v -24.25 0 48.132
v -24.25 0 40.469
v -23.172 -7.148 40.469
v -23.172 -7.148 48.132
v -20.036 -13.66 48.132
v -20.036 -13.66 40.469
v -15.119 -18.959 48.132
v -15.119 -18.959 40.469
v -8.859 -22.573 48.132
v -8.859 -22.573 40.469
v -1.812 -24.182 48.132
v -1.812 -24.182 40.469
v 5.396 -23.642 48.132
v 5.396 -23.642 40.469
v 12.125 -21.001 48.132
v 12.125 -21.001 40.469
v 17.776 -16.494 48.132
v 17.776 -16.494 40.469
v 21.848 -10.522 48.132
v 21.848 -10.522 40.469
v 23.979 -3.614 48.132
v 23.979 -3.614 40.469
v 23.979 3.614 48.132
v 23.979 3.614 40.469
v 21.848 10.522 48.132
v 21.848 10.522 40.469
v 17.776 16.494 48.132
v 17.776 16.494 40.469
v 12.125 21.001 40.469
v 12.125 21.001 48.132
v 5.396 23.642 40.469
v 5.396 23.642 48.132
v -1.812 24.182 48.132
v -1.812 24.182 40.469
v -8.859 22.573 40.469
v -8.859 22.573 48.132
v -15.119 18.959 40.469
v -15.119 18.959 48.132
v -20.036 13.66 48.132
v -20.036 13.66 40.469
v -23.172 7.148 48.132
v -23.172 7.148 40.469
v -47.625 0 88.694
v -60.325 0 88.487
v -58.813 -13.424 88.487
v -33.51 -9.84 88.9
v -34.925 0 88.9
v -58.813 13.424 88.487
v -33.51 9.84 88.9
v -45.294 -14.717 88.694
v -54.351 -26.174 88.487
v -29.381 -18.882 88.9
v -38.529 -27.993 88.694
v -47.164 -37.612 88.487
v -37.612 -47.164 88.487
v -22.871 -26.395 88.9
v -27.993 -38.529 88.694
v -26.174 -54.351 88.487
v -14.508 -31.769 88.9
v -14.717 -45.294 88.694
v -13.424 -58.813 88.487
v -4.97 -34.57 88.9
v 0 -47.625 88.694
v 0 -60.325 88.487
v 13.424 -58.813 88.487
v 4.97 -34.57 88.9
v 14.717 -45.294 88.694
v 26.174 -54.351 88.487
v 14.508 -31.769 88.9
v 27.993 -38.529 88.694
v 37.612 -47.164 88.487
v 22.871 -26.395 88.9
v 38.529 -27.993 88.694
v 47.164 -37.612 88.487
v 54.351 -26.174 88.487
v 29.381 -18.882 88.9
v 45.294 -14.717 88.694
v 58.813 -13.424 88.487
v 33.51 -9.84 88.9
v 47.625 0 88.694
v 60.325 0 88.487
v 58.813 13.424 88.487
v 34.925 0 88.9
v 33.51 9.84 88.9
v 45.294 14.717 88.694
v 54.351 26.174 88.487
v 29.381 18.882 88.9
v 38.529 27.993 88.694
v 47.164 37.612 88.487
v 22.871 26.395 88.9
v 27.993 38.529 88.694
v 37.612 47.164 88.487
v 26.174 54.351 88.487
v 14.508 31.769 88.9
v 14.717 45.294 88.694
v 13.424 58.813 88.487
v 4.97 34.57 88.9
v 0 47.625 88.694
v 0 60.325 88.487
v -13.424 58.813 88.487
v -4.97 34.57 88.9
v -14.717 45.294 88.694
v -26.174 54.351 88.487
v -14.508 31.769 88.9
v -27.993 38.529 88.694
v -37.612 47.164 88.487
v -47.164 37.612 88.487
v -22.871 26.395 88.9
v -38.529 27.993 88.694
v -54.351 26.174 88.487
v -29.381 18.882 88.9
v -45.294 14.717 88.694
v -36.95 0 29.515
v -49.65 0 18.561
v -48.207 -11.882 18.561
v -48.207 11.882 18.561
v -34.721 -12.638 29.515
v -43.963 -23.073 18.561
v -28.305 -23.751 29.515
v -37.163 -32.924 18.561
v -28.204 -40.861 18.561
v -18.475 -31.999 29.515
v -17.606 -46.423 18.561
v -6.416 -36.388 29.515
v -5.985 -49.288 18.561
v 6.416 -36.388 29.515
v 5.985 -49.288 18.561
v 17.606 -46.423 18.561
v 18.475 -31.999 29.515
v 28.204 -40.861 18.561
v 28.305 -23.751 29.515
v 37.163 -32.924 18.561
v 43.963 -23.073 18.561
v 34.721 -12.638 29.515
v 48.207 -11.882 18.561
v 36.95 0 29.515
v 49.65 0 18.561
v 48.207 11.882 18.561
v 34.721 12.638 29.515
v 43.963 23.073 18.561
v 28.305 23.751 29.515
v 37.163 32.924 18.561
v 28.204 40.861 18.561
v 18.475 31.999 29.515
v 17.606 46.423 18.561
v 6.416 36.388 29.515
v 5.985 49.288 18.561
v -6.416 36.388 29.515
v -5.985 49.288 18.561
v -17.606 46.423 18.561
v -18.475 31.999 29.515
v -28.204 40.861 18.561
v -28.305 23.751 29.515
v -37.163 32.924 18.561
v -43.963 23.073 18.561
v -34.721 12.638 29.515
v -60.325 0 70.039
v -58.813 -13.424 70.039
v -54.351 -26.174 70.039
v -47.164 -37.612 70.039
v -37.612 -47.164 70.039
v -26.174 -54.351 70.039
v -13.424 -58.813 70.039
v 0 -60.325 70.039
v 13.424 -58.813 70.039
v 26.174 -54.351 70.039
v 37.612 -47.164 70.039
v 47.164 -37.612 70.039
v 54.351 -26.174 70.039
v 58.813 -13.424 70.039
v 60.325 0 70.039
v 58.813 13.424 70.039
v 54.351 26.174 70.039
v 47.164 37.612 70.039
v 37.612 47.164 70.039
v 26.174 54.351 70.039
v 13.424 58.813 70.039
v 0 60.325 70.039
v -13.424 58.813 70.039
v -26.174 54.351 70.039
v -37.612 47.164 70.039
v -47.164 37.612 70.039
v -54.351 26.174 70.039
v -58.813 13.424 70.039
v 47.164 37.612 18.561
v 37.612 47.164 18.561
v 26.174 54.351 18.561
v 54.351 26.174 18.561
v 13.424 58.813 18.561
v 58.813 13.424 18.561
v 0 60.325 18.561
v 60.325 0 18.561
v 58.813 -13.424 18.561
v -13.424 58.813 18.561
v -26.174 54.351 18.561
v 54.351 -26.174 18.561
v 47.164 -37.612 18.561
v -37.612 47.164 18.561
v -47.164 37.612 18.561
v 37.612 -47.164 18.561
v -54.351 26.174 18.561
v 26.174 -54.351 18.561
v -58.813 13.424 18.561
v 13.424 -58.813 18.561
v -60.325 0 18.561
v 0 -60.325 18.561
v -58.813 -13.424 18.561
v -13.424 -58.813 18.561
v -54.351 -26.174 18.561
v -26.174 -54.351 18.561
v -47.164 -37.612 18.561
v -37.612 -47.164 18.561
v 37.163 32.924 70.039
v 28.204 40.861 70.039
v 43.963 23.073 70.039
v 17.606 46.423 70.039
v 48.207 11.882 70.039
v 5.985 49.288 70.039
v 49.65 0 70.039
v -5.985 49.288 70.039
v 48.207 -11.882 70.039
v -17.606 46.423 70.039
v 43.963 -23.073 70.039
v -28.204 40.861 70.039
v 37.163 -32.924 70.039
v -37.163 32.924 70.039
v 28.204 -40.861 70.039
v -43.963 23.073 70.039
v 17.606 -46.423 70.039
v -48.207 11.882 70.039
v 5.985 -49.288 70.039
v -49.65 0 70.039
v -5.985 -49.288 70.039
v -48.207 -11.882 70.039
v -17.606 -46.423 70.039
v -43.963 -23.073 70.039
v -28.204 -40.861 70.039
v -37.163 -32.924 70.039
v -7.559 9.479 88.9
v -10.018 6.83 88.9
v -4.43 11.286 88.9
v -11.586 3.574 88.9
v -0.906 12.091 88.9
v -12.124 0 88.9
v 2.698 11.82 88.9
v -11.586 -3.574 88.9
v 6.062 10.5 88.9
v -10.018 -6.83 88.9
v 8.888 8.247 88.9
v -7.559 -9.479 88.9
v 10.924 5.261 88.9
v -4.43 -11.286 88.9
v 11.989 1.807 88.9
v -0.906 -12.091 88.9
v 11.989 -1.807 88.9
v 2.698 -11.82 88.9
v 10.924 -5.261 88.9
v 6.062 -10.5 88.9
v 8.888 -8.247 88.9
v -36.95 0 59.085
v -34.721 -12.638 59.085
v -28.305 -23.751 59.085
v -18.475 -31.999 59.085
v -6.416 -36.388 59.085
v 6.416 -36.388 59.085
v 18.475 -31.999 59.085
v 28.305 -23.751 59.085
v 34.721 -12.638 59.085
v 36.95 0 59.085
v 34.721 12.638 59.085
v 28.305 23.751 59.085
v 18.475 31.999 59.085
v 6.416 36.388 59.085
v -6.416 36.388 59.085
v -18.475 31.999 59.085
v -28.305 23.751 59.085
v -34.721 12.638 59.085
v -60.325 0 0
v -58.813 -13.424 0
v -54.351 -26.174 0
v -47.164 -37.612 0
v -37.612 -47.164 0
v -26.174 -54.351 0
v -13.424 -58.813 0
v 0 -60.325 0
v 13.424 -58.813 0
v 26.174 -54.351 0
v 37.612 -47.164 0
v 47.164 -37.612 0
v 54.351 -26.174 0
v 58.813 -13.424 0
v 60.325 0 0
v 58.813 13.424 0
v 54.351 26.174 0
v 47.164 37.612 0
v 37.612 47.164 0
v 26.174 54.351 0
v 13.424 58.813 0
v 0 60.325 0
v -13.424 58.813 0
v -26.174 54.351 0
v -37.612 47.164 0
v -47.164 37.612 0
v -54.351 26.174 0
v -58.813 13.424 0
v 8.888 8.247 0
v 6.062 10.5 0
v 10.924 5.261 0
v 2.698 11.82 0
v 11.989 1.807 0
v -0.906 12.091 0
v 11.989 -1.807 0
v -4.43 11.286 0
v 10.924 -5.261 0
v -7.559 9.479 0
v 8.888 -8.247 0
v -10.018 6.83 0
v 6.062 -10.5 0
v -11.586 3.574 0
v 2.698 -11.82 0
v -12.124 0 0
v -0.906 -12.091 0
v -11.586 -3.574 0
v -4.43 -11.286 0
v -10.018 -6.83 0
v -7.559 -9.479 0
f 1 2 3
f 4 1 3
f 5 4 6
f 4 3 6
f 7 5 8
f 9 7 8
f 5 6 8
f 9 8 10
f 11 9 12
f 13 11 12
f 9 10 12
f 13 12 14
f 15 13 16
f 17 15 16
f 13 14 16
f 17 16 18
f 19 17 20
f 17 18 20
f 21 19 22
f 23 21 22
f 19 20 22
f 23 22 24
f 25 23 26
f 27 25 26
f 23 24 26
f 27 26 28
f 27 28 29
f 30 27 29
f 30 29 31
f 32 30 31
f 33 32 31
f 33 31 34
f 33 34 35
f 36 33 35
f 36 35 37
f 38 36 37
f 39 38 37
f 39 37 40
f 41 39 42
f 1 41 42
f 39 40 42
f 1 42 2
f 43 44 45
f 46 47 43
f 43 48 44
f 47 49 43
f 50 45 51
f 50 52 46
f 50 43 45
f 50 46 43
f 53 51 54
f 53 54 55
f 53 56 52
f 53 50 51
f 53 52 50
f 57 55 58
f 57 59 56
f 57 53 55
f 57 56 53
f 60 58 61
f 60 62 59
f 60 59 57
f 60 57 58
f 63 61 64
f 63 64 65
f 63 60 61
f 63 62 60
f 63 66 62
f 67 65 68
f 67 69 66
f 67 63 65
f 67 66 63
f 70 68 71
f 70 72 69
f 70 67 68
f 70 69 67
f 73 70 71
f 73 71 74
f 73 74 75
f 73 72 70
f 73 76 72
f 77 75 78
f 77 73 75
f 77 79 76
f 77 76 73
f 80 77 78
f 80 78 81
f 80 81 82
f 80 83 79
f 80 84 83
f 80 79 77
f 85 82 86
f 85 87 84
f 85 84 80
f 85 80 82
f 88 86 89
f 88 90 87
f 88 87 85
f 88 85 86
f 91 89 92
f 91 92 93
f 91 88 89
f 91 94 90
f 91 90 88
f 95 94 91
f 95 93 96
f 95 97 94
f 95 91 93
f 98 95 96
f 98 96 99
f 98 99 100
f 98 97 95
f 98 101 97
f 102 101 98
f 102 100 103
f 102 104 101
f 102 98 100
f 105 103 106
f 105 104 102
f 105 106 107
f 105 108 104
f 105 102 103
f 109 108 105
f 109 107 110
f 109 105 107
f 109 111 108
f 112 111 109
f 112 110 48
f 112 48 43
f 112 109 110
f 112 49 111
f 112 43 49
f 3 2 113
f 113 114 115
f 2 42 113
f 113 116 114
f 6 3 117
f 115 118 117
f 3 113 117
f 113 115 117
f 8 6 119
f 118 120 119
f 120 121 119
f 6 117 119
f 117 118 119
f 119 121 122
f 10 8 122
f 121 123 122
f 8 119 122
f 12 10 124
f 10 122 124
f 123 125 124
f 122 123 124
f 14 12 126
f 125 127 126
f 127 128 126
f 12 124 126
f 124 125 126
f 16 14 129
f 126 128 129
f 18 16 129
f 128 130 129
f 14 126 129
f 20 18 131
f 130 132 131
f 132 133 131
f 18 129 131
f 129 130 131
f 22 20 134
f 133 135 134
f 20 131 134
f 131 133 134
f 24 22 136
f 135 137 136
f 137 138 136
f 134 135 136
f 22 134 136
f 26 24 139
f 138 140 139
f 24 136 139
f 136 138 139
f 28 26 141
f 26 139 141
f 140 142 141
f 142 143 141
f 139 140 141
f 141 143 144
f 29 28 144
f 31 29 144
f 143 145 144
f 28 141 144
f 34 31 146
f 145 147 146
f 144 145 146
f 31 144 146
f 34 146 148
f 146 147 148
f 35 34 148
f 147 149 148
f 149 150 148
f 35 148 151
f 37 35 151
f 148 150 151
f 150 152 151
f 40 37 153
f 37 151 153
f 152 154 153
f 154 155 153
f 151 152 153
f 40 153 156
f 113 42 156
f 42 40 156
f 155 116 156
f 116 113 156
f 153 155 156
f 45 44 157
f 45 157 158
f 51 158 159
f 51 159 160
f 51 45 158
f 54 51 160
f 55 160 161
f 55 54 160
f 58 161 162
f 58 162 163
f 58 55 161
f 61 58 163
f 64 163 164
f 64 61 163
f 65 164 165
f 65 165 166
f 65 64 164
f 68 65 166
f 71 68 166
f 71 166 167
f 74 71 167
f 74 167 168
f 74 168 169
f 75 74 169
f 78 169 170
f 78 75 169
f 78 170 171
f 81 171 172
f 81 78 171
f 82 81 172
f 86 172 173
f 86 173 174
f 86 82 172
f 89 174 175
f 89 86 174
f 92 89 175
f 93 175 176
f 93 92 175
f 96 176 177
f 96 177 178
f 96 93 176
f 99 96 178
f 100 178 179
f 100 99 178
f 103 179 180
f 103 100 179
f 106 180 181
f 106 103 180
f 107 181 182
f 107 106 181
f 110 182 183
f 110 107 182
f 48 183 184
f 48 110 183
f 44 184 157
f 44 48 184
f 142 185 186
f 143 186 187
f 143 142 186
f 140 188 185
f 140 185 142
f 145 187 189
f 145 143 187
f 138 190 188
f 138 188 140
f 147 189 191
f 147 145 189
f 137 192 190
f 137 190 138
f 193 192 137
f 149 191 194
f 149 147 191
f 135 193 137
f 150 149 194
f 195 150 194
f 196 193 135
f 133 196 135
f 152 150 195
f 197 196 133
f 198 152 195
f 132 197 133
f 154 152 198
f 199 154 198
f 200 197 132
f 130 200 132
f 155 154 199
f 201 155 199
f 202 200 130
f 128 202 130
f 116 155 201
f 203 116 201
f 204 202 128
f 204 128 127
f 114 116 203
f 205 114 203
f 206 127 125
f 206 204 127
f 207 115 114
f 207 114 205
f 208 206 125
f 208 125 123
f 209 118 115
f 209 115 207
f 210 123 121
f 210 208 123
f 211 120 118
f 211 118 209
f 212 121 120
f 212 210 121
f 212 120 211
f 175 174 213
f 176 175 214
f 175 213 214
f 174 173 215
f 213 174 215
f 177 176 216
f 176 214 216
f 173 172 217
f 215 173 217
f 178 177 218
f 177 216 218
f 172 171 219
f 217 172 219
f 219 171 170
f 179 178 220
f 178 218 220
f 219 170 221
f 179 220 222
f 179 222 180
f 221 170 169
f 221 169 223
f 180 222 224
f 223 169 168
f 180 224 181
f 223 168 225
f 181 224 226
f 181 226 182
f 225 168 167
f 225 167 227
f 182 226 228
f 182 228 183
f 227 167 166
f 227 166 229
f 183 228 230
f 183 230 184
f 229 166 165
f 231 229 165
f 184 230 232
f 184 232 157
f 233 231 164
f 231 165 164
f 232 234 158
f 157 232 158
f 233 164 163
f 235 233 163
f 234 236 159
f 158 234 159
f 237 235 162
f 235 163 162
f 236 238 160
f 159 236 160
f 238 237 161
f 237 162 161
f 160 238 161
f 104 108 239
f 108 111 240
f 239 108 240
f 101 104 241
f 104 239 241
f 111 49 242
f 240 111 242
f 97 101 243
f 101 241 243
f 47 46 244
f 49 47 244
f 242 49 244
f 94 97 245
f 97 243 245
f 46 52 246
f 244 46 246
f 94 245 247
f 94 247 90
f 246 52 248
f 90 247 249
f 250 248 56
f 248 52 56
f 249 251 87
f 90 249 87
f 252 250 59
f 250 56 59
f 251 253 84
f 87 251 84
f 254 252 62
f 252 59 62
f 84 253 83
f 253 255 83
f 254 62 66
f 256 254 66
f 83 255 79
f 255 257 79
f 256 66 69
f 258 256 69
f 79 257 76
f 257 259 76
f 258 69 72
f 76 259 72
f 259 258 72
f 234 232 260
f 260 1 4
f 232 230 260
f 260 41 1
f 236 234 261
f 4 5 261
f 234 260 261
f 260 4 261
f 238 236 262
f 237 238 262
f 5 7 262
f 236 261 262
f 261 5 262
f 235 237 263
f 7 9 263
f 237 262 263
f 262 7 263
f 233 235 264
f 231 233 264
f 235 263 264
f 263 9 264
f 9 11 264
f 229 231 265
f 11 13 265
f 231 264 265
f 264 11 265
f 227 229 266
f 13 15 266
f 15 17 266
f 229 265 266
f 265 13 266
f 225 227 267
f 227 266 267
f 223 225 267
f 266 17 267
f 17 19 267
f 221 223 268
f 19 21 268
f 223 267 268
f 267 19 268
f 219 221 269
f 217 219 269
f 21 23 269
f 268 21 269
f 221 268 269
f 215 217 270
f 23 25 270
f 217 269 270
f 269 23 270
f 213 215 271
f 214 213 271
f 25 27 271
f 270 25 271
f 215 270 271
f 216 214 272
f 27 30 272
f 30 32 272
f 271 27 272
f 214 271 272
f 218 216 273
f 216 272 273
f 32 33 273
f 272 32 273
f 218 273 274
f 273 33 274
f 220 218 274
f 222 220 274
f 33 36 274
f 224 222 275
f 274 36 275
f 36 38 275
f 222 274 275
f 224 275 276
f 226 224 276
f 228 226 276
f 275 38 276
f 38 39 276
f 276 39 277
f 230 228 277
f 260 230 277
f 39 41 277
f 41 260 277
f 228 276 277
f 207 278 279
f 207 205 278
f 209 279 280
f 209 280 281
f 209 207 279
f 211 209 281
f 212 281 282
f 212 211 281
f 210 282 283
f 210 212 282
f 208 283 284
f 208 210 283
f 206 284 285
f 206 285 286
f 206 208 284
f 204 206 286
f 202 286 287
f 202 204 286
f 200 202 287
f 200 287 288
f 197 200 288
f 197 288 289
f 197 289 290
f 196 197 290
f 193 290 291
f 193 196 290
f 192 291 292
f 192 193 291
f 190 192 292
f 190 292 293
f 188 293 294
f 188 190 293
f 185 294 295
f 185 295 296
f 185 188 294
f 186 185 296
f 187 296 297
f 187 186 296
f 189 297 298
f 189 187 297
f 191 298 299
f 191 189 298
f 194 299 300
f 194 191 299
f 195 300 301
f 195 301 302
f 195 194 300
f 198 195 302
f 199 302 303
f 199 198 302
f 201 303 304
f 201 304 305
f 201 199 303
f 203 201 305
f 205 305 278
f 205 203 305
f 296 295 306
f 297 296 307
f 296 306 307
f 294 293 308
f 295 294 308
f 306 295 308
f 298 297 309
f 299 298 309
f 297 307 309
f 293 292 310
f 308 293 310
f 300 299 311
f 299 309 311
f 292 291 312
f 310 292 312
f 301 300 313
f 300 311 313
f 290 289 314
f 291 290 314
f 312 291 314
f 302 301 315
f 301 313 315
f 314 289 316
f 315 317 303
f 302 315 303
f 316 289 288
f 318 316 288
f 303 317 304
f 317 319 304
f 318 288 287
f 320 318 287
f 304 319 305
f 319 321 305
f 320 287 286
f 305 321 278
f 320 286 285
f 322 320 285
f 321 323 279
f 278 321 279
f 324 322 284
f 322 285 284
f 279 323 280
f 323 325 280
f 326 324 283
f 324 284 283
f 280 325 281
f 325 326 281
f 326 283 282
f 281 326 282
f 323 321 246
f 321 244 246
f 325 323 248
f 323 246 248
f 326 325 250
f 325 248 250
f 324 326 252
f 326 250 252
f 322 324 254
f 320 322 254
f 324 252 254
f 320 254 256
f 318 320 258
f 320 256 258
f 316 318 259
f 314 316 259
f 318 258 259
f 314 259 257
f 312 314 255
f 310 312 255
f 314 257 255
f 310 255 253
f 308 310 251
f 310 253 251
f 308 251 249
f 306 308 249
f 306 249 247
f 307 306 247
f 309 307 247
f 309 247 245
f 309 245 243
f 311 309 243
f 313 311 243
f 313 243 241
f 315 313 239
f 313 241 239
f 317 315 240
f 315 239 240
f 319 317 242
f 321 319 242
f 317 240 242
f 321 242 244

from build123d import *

# Parameters (mm, degrees)
F0_W        = 36.0753956601
F0_H        = 18.8608030145
F0_W_2      = 12.1251638026
F0_H_2      = 51.4777676715
F0_H_3      = 18.561429314
F2_C1_SIZE2 = 21.9075
F2_C1_SIZE  = 25.4
F2_C2_SIZE2 = 25.4
F2_C2_SIZE  = 21.9075
F4_SIZE2    = 25.4
F4_SIZE     = 0.41275


# Not quite as in the source:
# - a feature of the source that left no trace in its solid (it failed there, or was rolled back) is left out


with BuildPart() as f1:
    # F0 (on Front) → F1 (revolve)
    with BuildSketch(Plane.XZ):
        with Locations((-42.2873021699, 79.4695984927)):
            Rectangle(F0_W, F0_H)
        with Locations((-18.1870224386, 79.4695984927)):
            Rectangle(F0_W_2, F0_H)
        with Locations((-18.1870224386, 44.3003131497)):
            Rectangle(F0_W_2, F0_H_2)
        with Locations((-18.1870224386, 9.280714657)):
            Rectangle(F0_W_2, F0_H_3)
        with Locations((-42.2873021699, 9.280714657)):
            Rectangle(F0_W, F0_H_3)
    revolve(axis=Axis((0, 0, 53.2892593555), (0, 0, 1)))

    # F2: chamfer of 21.9075 x 25.4 on 2 edges, made by hand

    # F2_c1
    f2_c1_edges = [f1.edges().sort_by_distance(p)[0] for p in [
        (24.2496043399, 0, 70.0391969855),
    ]]
    f2_c1_side = f1.faces().sort_by_distance((24.6877543399, 0, 70.0391969855))[0]
    chamfer(f2_c1_edges, length=F2_C1_SIZE, length2=F2_C1_SIZE2, reference=f2_c1_side)

    # F2_c2
    f2_c2_edges = [f1.edges().sort_by_distance(p)[0] for p in [
        (24.2496043399, 0, 18.561429314),
    ]]
    f2_c2_side = f1.faces().sort_by_distance((24.2496043399, 0, 18.999579314))[0]
    chamfer(f2_c2_edges, length=F2_C2_SIZE, length2=F2_C2_SIZE2, reference=f2_c2_side)

    # F4
    f4_edges = [f1.edges().sort_by_distance(p)[0] for p in [
        (60.325, 0, 88.9),
    ]]
    chamfer(f4_edges, length=F4_SIZE, length2=F4_SIZE2)


solid = f1.part
